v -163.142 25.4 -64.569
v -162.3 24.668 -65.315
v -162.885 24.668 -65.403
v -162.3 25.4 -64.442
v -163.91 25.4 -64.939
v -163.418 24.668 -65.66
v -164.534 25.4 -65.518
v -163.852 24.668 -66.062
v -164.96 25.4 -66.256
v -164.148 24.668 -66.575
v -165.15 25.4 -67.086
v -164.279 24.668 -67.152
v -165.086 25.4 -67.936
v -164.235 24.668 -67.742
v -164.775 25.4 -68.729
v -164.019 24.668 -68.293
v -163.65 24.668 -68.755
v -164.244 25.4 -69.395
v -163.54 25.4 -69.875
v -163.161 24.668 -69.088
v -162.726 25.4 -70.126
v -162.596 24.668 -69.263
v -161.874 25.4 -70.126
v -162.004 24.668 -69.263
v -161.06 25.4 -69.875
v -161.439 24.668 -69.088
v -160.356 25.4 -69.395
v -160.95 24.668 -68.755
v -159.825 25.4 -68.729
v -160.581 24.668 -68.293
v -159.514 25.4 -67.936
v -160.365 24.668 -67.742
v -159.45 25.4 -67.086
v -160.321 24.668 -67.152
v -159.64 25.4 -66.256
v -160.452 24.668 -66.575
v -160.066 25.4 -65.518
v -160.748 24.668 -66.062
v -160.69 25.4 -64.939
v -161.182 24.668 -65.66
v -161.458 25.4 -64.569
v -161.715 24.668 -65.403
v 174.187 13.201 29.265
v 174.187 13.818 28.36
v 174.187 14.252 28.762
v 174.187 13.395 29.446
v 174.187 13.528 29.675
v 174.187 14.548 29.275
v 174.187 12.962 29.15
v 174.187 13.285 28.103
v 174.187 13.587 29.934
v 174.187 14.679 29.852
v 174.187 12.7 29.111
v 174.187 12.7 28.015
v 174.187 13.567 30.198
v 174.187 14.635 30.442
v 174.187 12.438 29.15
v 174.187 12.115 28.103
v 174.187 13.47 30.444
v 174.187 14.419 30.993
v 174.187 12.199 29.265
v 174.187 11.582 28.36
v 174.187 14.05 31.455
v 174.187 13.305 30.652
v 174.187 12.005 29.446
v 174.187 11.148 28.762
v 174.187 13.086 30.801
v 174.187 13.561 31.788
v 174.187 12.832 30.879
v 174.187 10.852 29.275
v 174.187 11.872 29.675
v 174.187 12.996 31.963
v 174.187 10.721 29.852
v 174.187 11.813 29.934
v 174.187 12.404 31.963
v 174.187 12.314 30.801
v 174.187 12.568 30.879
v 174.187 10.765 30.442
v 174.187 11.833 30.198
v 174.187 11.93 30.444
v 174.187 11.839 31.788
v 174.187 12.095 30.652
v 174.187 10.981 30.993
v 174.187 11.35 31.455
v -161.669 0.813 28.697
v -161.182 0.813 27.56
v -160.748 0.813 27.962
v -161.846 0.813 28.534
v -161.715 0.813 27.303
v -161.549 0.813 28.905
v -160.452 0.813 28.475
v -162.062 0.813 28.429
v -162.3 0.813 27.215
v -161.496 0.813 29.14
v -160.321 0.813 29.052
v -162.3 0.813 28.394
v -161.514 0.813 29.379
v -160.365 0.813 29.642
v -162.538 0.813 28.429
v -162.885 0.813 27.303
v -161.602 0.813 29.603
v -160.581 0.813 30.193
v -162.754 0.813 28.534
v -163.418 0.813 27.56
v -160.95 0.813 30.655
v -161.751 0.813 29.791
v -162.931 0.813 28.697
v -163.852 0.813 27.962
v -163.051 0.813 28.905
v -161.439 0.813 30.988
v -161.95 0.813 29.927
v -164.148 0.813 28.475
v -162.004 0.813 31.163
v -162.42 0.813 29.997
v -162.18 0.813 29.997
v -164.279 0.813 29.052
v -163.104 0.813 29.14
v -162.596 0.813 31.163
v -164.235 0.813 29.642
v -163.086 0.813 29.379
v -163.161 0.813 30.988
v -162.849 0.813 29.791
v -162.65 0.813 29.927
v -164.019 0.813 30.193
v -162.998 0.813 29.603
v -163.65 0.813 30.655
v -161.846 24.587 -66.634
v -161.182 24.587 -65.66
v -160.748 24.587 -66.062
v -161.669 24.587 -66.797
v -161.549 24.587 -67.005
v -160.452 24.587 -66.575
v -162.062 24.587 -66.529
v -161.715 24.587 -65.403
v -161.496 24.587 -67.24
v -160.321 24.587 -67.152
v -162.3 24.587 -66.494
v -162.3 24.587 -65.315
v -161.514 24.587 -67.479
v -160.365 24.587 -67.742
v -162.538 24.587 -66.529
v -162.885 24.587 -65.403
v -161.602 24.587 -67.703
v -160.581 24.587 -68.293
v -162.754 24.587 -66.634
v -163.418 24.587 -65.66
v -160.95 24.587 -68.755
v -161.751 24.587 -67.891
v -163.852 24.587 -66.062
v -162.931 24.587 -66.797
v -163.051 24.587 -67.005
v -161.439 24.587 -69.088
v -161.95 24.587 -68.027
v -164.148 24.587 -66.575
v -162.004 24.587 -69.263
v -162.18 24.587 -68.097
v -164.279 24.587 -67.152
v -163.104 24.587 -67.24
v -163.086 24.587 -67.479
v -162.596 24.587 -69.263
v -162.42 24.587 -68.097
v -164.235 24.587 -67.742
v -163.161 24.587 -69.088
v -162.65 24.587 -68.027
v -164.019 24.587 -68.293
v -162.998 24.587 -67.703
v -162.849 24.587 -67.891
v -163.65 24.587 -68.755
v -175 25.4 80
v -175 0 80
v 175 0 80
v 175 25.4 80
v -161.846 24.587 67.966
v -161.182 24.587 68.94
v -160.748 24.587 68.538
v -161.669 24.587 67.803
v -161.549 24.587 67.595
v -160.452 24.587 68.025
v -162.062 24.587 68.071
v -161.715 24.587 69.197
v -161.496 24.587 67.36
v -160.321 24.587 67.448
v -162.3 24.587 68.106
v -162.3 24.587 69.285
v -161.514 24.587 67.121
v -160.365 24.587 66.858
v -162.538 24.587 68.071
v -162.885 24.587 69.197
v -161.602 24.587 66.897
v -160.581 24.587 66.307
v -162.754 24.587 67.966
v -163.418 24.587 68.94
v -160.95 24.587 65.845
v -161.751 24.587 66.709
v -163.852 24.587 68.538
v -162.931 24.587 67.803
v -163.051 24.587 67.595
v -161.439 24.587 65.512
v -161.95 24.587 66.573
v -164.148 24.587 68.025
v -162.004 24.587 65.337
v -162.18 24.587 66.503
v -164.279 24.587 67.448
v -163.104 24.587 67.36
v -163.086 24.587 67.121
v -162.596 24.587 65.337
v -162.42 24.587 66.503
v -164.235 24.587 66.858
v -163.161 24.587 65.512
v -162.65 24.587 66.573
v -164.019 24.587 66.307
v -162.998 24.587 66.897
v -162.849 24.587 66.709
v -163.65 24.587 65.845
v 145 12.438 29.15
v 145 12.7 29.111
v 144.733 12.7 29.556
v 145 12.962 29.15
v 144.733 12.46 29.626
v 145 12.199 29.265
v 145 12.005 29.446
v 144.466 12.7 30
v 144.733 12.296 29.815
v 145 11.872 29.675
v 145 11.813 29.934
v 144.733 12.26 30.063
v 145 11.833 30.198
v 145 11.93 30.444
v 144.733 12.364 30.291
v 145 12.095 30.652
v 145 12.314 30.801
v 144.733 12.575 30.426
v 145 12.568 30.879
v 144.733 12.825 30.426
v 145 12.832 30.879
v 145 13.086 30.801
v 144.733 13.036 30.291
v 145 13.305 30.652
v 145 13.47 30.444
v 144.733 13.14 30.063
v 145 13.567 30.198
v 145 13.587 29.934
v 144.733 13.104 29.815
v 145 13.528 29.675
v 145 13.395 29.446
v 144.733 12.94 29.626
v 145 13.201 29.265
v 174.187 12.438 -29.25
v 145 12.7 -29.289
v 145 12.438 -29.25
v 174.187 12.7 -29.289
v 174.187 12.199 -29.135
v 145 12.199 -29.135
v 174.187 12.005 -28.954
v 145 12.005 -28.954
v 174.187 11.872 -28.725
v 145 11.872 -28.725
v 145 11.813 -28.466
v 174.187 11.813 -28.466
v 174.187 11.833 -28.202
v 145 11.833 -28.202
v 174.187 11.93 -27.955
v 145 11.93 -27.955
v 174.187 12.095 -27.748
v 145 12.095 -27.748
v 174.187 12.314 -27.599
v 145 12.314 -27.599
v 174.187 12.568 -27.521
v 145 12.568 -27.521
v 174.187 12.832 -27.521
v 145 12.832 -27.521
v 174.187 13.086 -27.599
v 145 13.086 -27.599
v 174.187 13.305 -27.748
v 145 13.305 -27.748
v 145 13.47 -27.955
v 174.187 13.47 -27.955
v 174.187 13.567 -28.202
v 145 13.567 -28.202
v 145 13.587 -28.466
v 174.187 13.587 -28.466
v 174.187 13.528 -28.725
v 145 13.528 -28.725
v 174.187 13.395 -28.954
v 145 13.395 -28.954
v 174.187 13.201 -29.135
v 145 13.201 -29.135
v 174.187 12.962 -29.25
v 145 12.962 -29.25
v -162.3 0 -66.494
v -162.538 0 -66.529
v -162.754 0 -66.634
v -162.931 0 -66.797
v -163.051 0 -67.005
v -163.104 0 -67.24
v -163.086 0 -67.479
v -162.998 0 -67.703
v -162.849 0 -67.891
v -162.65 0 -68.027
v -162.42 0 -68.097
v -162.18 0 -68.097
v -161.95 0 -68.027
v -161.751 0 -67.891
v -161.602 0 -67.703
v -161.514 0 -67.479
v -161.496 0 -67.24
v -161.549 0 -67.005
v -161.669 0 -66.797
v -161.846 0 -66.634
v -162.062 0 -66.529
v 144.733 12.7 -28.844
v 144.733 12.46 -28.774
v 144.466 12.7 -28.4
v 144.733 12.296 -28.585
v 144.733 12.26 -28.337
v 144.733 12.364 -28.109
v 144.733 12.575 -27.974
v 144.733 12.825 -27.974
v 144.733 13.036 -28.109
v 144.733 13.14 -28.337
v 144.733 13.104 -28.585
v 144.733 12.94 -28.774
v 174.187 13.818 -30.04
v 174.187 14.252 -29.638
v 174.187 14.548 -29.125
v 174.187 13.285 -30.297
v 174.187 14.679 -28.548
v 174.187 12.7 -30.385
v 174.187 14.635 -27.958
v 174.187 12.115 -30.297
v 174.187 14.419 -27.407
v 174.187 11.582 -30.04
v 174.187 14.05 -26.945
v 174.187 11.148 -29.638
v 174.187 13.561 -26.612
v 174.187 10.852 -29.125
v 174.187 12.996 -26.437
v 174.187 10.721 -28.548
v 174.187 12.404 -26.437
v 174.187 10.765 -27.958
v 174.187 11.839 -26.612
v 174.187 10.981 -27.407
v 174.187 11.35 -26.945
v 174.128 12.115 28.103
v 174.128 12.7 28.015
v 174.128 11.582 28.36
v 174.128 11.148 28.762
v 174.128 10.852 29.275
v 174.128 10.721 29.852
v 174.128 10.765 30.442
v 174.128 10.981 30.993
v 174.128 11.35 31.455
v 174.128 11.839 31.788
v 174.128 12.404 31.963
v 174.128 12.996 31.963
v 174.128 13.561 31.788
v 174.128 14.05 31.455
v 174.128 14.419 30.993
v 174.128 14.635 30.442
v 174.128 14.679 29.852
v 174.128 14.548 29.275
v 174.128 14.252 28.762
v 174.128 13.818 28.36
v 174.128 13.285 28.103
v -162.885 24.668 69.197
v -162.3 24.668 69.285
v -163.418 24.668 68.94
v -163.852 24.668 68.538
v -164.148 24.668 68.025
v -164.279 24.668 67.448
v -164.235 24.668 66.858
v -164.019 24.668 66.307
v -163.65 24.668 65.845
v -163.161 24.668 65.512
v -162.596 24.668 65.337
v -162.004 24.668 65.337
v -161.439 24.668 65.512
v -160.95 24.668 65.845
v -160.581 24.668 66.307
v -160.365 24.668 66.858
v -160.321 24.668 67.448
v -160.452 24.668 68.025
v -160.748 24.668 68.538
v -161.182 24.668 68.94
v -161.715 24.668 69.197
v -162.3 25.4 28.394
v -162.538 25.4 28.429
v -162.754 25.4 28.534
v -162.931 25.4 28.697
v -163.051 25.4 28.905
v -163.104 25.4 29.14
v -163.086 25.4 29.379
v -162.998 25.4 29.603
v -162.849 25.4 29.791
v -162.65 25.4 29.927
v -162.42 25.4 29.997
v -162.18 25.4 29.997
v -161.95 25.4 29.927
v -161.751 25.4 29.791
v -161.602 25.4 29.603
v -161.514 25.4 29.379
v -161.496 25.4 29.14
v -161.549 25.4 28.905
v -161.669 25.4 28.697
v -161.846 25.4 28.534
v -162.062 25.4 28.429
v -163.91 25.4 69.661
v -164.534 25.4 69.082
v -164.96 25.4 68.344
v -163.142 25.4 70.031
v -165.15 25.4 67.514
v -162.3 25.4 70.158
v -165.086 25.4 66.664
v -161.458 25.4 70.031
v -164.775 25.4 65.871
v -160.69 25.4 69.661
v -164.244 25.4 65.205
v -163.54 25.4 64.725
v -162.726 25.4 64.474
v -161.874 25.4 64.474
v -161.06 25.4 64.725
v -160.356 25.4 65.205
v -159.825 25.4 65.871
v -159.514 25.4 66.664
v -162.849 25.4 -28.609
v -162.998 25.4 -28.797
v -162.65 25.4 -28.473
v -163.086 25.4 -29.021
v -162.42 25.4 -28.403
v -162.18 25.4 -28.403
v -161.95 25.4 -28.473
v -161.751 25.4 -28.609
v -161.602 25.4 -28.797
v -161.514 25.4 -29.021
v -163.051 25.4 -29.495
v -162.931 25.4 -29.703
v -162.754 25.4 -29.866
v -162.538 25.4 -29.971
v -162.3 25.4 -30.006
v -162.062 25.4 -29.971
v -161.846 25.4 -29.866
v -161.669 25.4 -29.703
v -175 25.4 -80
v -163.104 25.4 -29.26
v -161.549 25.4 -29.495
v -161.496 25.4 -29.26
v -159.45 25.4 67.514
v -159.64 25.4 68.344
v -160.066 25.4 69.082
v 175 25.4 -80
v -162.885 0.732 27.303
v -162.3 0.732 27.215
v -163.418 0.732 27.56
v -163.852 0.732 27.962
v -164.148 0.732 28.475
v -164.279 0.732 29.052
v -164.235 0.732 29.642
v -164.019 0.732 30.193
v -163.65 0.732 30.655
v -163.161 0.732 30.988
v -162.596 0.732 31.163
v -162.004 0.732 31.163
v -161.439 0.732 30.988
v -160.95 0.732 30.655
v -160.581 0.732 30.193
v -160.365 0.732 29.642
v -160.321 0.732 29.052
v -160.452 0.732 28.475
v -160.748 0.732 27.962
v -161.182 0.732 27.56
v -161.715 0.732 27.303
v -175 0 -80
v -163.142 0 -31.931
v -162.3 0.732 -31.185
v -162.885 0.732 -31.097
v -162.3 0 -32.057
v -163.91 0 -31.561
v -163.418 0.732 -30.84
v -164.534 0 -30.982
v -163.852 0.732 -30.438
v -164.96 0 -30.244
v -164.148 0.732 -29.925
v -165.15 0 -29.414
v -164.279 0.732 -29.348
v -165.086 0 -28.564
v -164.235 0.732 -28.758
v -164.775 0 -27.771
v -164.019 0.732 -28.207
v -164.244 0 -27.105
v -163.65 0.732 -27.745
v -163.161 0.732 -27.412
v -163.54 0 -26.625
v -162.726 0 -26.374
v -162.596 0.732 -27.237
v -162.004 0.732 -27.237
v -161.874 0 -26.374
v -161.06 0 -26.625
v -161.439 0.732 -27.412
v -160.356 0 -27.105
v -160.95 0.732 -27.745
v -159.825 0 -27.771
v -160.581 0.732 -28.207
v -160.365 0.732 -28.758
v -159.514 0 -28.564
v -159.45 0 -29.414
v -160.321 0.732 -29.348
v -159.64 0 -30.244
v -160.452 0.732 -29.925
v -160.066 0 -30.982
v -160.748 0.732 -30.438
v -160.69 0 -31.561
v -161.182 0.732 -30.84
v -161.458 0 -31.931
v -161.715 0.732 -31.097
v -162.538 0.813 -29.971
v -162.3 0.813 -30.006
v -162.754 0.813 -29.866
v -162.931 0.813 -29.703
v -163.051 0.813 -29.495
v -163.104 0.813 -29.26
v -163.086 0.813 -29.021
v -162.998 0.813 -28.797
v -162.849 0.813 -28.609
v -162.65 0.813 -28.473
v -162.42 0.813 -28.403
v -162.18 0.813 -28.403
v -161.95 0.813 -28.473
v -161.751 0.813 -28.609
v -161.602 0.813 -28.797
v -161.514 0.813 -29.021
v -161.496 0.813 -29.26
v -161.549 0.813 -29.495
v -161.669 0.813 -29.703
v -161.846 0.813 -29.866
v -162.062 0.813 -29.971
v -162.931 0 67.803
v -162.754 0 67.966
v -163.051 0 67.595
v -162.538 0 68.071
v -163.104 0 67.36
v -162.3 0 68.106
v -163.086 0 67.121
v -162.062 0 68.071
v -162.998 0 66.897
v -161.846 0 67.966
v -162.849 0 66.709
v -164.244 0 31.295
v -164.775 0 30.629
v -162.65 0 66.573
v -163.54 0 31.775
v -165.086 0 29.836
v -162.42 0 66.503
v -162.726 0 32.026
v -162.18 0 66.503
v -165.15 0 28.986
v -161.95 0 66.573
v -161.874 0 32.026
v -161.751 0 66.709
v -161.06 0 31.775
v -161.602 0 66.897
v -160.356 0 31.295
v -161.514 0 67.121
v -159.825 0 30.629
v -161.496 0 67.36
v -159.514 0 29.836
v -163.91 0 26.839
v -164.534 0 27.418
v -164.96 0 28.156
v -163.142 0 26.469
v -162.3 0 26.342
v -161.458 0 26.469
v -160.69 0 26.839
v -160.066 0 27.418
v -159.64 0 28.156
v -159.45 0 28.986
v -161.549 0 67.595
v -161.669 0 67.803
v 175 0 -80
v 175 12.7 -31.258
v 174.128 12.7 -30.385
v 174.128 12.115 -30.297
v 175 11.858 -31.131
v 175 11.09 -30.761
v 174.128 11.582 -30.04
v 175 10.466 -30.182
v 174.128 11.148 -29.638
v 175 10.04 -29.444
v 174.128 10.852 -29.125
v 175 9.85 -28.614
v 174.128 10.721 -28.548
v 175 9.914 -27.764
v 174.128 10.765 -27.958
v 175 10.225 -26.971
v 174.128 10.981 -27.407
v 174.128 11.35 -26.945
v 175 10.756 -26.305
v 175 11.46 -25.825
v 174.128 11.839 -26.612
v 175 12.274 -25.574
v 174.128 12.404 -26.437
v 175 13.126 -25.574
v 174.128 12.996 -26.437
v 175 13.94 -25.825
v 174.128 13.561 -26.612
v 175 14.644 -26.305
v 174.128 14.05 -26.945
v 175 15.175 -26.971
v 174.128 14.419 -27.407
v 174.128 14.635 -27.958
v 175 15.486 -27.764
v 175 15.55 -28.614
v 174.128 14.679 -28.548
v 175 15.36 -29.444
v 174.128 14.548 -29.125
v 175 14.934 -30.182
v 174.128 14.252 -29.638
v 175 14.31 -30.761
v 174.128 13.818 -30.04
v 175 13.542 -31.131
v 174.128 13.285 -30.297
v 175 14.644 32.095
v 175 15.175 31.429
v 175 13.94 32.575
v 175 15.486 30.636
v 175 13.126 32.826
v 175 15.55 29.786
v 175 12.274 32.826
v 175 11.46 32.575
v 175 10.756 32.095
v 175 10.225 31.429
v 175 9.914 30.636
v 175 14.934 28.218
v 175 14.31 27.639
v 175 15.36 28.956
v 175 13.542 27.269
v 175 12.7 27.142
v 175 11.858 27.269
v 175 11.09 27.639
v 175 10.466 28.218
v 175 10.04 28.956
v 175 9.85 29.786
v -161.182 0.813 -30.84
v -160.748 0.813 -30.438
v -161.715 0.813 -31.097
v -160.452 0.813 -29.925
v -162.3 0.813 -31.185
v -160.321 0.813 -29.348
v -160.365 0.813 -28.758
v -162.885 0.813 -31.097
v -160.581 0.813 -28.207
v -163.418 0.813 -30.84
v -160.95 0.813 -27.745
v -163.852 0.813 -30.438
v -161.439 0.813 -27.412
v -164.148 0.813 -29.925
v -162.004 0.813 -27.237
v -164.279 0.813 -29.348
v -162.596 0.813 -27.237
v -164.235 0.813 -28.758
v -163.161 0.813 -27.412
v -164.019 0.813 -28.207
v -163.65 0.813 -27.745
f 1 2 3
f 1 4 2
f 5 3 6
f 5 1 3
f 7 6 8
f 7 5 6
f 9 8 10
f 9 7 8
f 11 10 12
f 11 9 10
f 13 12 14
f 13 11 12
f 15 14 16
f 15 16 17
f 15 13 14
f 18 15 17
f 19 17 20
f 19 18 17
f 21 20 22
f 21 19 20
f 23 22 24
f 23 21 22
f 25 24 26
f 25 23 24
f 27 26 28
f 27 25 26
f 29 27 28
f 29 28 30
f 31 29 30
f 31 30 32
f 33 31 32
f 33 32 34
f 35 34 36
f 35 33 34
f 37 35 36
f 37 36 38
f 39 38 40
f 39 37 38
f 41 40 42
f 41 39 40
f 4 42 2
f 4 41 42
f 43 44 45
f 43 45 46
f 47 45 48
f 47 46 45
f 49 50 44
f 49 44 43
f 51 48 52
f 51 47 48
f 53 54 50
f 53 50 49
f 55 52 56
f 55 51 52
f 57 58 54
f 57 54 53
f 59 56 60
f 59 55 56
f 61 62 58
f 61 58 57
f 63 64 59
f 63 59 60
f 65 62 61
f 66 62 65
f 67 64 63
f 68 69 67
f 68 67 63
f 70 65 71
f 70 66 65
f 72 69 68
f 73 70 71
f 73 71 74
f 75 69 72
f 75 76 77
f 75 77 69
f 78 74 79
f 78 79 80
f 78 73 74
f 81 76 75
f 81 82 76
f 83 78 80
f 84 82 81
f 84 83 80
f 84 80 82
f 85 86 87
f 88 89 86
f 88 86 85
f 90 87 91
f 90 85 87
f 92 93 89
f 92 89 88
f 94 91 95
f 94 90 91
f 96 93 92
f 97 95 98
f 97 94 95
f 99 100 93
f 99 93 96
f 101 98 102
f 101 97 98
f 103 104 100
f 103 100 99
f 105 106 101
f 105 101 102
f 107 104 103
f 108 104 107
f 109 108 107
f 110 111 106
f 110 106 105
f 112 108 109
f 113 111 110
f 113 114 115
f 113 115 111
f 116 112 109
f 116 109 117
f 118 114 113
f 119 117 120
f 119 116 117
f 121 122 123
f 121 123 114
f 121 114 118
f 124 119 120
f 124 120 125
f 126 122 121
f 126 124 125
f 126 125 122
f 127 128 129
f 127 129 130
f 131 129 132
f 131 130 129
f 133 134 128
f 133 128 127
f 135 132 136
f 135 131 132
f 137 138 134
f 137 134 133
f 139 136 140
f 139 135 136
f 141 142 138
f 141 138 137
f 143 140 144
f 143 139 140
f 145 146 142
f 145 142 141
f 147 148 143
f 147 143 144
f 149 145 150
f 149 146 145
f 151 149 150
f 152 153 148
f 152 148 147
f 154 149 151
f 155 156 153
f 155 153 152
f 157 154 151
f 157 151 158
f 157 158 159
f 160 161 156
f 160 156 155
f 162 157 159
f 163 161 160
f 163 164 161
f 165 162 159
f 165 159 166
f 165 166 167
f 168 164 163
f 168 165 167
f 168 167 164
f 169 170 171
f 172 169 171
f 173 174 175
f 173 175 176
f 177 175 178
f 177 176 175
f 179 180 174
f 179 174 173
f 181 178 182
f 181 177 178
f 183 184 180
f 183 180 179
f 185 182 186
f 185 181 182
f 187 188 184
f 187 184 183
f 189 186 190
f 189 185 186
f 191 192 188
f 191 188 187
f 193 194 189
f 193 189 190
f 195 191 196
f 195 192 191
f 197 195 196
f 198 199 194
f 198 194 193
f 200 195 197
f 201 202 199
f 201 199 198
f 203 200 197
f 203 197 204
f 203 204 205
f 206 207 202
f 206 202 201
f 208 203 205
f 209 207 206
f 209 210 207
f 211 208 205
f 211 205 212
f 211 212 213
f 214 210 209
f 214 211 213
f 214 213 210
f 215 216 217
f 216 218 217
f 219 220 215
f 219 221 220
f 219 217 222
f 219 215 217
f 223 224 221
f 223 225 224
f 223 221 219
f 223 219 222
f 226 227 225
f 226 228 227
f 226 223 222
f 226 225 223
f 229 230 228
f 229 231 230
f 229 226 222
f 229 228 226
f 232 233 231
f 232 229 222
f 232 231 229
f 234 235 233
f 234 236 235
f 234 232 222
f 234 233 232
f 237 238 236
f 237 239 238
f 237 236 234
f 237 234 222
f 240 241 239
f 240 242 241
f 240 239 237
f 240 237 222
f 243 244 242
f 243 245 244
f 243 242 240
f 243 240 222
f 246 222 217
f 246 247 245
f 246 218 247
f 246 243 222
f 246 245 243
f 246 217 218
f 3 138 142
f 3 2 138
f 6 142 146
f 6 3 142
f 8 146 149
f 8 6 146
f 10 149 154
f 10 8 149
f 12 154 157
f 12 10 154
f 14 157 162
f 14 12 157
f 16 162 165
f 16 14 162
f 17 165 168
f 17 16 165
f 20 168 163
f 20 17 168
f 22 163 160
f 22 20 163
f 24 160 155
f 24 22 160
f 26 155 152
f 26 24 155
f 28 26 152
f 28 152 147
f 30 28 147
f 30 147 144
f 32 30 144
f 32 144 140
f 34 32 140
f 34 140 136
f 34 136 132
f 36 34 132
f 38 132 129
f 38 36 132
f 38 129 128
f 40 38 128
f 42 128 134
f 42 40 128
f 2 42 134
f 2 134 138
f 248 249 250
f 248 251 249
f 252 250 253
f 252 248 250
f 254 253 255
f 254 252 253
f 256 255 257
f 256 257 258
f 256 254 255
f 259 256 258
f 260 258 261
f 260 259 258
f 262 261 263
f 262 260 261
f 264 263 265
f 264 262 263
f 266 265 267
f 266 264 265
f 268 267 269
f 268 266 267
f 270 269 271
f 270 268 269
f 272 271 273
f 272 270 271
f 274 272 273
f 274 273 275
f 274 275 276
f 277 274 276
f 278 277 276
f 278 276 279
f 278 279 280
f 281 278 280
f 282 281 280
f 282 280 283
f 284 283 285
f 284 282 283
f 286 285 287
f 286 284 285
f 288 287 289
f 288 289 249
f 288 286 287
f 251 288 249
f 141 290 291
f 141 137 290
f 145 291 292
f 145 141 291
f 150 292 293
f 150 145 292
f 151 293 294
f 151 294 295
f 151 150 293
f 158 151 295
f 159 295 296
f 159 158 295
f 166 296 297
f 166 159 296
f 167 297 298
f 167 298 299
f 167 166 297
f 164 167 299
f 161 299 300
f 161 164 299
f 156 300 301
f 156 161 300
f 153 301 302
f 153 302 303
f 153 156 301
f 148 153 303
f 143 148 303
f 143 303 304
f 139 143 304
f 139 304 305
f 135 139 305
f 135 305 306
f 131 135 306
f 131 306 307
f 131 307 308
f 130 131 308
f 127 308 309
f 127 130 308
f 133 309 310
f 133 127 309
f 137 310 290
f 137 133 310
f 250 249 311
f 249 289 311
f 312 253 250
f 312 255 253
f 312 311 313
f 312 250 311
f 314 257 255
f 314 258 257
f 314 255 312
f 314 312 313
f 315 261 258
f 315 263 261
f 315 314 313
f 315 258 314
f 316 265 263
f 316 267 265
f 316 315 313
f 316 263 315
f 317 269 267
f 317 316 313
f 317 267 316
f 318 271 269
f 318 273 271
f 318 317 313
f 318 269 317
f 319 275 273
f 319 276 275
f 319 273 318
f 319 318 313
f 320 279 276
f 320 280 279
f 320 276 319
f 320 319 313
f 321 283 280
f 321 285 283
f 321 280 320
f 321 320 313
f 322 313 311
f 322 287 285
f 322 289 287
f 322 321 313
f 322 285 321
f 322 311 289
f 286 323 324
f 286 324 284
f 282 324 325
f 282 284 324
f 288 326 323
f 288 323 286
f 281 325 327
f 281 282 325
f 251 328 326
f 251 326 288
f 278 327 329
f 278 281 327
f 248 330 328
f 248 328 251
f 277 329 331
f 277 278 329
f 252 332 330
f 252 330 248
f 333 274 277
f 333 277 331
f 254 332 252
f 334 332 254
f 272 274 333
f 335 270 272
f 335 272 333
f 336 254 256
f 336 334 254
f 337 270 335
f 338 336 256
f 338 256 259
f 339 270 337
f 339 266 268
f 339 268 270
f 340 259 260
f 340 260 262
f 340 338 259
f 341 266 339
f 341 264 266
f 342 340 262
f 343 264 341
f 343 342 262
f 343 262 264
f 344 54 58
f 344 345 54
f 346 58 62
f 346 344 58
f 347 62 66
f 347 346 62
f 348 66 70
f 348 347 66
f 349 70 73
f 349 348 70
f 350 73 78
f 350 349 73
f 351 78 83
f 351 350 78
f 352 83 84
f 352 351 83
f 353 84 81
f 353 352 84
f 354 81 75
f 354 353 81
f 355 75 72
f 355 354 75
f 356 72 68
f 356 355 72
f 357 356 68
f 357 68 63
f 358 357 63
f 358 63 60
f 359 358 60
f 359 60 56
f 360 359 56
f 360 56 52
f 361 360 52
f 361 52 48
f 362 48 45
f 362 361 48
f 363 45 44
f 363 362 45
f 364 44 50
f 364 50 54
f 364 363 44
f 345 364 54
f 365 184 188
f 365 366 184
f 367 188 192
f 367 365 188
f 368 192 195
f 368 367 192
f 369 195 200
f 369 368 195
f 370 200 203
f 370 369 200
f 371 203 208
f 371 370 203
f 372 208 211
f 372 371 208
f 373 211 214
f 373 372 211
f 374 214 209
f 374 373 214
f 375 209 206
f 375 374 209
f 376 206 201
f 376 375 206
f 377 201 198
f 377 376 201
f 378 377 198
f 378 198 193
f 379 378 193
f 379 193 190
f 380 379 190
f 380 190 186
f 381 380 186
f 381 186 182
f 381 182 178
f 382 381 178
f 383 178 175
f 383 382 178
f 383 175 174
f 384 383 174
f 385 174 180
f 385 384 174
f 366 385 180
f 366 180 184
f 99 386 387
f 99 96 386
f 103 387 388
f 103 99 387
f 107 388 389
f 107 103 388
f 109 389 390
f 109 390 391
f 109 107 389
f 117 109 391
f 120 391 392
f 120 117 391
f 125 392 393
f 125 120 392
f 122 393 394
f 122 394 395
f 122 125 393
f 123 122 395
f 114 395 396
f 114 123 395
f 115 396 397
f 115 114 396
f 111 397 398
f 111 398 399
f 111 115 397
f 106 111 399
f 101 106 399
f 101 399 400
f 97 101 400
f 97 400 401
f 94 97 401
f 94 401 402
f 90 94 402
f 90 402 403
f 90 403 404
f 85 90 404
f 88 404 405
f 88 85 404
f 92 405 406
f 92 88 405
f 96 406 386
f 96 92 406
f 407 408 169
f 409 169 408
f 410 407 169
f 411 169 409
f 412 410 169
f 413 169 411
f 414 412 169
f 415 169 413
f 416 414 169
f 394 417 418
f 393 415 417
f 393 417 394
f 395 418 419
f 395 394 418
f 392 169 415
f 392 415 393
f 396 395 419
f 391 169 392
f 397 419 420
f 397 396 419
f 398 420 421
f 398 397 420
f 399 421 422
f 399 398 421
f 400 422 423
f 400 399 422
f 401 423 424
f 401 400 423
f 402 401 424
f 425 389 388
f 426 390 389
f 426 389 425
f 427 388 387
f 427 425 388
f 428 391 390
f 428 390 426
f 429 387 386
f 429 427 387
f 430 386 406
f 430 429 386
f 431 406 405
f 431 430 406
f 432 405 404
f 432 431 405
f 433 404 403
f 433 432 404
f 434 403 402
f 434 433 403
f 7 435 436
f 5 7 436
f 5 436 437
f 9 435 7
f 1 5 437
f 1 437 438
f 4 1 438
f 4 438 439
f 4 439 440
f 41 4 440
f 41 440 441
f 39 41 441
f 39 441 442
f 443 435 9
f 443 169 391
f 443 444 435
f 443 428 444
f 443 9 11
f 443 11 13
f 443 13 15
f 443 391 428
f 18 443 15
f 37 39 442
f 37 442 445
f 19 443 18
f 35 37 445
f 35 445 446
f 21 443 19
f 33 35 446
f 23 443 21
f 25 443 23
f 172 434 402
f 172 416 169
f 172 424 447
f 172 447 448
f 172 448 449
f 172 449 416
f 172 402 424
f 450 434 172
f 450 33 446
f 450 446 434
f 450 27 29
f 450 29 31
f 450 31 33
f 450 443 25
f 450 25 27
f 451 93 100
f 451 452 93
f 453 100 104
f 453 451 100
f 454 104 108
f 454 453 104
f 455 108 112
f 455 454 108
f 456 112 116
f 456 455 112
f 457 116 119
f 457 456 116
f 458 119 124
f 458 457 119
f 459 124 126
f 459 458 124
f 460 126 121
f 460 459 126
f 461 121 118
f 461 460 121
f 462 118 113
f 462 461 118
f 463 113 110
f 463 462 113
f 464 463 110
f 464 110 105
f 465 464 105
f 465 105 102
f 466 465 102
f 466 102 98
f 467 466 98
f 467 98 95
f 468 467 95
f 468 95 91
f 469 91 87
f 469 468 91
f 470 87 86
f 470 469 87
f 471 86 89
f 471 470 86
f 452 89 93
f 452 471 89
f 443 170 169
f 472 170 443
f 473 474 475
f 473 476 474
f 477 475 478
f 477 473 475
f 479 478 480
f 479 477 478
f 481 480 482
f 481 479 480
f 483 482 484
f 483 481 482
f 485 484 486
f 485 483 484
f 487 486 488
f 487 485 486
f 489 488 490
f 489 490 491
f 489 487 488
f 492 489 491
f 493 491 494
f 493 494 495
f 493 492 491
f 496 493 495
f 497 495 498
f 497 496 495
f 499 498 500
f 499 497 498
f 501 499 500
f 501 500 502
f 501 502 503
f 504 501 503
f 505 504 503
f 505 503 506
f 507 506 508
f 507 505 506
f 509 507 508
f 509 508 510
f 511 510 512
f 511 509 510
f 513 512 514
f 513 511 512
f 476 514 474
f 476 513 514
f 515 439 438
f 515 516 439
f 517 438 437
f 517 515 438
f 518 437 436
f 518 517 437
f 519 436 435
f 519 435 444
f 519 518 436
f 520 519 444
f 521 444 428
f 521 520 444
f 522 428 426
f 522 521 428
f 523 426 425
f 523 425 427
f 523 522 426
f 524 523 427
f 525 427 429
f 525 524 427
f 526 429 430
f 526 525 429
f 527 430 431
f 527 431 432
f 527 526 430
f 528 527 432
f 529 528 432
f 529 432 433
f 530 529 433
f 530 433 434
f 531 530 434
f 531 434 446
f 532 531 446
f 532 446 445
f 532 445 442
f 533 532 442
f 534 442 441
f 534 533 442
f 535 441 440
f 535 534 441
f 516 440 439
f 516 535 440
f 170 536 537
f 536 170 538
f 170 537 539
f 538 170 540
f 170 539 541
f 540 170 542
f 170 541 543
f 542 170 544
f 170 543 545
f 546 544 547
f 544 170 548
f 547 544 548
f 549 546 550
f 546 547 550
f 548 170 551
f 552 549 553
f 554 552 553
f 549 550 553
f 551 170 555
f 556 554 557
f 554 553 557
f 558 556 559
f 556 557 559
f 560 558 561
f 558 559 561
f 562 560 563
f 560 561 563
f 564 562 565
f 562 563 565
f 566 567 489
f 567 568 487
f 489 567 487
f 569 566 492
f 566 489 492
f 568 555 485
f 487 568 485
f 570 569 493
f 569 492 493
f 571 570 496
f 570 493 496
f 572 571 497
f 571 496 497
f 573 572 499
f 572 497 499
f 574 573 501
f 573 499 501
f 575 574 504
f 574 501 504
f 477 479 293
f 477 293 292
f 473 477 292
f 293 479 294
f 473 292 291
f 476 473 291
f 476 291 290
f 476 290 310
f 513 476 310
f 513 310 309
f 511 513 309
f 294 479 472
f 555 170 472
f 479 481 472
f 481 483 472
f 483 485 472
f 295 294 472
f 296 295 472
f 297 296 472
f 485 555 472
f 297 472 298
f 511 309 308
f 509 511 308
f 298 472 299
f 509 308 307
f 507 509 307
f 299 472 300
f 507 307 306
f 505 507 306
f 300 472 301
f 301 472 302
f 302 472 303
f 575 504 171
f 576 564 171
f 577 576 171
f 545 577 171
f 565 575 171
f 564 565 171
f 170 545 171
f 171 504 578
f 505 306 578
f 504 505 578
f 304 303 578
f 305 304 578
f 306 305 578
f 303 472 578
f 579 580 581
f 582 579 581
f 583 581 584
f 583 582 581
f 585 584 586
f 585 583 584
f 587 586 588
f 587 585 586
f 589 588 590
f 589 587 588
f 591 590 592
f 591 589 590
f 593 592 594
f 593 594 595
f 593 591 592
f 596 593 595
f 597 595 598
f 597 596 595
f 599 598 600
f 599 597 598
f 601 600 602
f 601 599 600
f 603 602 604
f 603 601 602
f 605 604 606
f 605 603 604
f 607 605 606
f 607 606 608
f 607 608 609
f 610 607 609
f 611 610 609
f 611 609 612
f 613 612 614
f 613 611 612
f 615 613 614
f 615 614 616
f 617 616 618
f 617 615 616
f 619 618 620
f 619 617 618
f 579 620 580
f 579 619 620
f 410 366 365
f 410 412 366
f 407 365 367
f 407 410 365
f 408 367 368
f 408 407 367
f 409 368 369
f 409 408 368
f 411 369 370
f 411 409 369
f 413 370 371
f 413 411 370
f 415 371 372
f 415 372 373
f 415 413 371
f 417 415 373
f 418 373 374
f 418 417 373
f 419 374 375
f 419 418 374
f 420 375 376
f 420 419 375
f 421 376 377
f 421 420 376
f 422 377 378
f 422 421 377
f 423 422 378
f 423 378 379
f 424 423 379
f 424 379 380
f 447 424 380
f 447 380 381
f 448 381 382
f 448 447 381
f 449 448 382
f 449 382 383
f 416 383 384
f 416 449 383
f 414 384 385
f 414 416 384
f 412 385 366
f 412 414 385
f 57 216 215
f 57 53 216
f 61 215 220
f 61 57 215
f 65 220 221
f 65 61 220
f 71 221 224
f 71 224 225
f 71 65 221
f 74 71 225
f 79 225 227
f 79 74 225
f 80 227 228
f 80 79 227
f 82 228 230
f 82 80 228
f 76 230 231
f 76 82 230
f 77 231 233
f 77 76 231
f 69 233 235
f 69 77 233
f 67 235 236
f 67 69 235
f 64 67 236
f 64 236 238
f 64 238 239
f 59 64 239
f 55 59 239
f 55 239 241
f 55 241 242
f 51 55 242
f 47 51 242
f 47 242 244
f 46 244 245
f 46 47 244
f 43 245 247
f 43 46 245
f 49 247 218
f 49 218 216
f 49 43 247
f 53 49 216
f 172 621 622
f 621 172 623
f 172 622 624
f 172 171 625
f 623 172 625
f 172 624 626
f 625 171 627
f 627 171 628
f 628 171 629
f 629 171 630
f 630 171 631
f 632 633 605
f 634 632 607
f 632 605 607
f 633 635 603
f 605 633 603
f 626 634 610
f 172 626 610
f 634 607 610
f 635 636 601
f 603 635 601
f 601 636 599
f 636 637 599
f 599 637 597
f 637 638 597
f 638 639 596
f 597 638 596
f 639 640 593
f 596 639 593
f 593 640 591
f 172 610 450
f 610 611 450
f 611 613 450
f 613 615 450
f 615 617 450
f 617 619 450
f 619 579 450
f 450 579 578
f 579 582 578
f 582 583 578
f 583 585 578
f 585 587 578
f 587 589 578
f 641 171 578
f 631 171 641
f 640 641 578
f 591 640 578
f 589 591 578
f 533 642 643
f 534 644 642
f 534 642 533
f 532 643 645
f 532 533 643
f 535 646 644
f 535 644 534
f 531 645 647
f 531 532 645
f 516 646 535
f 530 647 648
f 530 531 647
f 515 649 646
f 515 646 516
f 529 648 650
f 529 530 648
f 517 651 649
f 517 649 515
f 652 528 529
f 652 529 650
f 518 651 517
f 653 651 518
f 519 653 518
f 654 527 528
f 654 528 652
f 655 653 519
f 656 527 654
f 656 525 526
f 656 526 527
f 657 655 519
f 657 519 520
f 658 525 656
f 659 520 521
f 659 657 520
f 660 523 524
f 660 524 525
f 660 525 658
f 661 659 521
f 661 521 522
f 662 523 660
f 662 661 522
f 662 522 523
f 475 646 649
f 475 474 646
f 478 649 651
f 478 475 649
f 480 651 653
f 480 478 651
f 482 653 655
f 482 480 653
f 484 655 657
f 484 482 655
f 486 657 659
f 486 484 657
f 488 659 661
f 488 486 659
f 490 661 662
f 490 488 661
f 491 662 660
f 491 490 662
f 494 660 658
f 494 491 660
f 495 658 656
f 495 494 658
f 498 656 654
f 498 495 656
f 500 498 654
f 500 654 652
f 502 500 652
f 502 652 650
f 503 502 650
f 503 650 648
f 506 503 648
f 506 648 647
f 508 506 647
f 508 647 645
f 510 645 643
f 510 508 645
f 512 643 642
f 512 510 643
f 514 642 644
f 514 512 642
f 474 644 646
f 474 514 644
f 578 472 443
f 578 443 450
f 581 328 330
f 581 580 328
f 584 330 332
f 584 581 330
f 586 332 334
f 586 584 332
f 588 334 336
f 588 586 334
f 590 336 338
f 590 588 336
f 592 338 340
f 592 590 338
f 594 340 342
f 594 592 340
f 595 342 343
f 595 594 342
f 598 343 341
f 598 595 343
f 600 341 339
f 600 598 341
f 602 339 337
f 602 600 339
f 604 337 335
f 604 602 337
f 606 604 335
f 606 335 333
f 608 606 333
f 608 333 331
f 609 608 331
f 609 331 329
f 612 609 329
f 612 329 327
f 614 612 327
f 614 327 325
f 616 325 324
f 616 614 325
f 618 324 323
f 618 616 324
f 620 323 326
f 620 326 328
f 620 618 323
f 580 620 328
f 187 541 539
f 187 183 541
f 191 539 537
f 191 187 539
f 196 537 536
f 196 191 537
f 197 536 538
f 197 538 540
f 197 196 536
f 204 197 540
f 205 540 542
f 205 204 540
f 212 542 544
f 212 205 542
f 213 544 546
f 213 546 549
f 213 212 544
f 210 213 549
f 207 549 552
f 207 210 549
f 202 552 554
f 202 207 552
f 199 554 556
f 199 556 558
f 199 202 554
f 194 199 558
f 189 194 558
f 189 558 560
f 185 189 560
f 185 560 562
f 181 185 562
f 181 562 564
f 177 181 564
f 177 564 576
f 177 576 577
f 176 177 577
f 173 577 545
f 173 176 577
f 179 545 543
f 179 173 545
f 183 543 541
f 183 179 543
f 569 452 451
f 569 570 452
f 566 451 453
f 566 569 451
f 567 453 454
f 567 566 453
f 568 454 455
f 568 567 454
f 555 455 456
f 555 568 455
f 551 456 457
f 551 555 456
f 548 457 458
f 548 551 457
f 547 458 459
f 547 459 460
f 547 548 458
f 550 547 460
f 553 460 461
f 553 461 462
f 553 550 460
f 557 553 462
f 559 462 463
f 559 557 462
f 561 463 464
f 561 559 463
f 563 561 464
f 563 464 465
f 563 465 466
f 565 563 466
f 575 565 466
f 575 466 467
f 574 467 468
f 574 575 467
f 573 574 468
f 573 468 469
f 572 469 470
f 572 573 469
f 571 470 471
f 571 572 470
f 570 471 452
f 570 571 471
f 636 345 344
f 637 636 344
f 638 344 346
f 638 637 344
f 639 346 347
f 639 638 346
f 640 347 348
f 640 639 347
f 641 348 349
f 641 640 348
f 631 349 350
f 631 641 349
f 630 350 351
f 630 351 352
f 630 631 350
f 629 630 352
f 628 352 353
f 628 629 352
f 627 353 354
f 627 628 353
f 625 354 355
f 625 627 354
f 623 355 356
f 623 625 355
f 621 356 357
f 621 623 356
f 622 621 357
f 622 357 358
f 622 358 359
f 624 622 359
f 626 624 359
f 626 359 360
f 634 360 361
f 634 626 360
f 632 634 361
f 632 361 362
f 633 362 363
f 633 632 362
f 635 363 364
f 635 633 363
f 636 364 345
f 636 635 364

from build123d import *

# Parameters (mm, degrees)
SKETCH1_W                                   = 350
SKETCH1_H                                   = 160
BOSS_EXTRUDE1_DEPTH                         = 25.4
CBORE_FOR_0_BINDING_HEAD_MACHINE_SC_2_COUNT = 2
CBORE_FOR_0_BINDING_HEAD_MACHINE_SC_2_PITCH = 58.4
CBORE_FOR_0_BINDING_HEAD_MACHINE_SC_3_COUNT = 2
CBORE_FOR_0_BINDING_HEAD_MACHINE_SC_3_PITCH = 134.6
CBORE_FOR_0_BINDING_HEAD_MACHINE_SC_4_COUNT = 2
CBORE_FOR_0_BINDING_HEAD_MACHINE_SC_4_PITCH = 58.4


with BuildPart() as part:
    # Sketch1 → Boss-Extrude1 (new body)
    with BuildSketch(Plane(origin=(0, 0, 0), x_dir=(1, 0, 0), z_dir=(0, 1, 0))):
        Rectangle(SKETCH1_W, SKETCH1_H)
    extrude(amount=BOSS_EXTRUDE1_DEPTH)

    # Sketch3 → CBORE for #0 Binding Head Machine Screw3 (revolve, cut)
    with BuildSketch(Plane(origin=(175, 12.7, 30), x_dir=(0, 0, -1), z_dir=(0, 1, 0))):
        Polygon((0, 0), (0, 30.53416509), (0.889, 30), (0.889, 0.8128), (1.98501, 0.8128), (1.98501, 0.87249), (2.8575, 0), align=None)
    cbore_for_0_binding_head_machine_screw3 = revolve(axis=Axis((181.35, 12.7, 30), (-1, 0, 0)), mode=Mode.SUBTRACT)

    # CBORE for _0 Binding Head Machine Sc 2: CBORE for #0 Binding Head Machine Screw3 ×2
    with Locations(*[(0, 0, -i * CBORE_FOR_0_BINDING_HEAD_MACHINE_SC_2_PITCH) for i in range(1, CBORE_FOR_0_BINDING_HEAD_MACHINE_SC_2_COUNT)]):
        add(cbore_for_0_binding_head_machine_screw3, mode=Mode.SUBTRACT)

    # Sketch7 → CBORE for #0 Binding Head Machine Screw1 (revolve, cut)
    with BuildSketch(Plane(origin=(-162.3, 25.4, 67.3), x_dir=(0, 0, 1), z_dir=(1, 0, 0))):
        Polygon((0, 0), (0, 25.4), (0.80645, 25.4), (0.80645, 0.8128), (1.98501, 0.8128), (1.98501, 0.732106037), (2.8575, 0), align=None)
    cbore_for_0_binding_head_machine_screw1 = revolve(axis=Axis((-162.3, 31.75, 67.3), (0, -1, 0)), mode=Mode.SUBTRACT)

    # CBORE for _0 Binding Head Machine Sc 3: CBORE for #0 Binding Head Machine Screw1 ×2
    with Locations(*[(0, 0, -i * CBORE_FOR_0_BINDING_HEAD_MACHINE_SC_3_PITCH) for i in range(1, CBORE_FOR_0_BINDING_HEAD_MACHINE_SC_3_COUNT)]):
        add(cbore_for_0_binding_head_machine_screw1, mode=Mode.SUBTRACT)

    # Sketch9 → CBORE for #0 Binding Head Machine Screw2 (revolve, cut)
    with BuildSketch(Plane(origin=(-162.3, 0, -29.2), x_dir=(0, 0, -1), z_dir=(1, 0, 0))):
        Polygon((0, 0), (0, 25.4), (0.80645, 25.4), (0.80645, 0.8128), (1.98501, 0.8128), (1.98501, 0.732106037), (2.8575, 0), align=None)
    cbore_for_0_binding_head_machine_screw2 = revolve(axis=Axis((-162.3, -6.35, -29.2), (0, 1, 0)), mode=Mode.SUBTRACT)

    # CBORE for _0 Binding Head Machine Sc 4: CBORE for #0 Binding Head Machine Screw2 ×2
    with Locations(*[(0, 0, i * CBORE_FOR_0_BINDING_HEAD_MACHINE_SC_4_PITCH) for i in range(1, CBORE_FOR_0_BINDING_HEAD_MACHINE_SC_4_COUNT)]):
        add(cbore_for_0_binding_head_machine_screw2, mode=Mode.SUBTRACT)


solid = part.part
